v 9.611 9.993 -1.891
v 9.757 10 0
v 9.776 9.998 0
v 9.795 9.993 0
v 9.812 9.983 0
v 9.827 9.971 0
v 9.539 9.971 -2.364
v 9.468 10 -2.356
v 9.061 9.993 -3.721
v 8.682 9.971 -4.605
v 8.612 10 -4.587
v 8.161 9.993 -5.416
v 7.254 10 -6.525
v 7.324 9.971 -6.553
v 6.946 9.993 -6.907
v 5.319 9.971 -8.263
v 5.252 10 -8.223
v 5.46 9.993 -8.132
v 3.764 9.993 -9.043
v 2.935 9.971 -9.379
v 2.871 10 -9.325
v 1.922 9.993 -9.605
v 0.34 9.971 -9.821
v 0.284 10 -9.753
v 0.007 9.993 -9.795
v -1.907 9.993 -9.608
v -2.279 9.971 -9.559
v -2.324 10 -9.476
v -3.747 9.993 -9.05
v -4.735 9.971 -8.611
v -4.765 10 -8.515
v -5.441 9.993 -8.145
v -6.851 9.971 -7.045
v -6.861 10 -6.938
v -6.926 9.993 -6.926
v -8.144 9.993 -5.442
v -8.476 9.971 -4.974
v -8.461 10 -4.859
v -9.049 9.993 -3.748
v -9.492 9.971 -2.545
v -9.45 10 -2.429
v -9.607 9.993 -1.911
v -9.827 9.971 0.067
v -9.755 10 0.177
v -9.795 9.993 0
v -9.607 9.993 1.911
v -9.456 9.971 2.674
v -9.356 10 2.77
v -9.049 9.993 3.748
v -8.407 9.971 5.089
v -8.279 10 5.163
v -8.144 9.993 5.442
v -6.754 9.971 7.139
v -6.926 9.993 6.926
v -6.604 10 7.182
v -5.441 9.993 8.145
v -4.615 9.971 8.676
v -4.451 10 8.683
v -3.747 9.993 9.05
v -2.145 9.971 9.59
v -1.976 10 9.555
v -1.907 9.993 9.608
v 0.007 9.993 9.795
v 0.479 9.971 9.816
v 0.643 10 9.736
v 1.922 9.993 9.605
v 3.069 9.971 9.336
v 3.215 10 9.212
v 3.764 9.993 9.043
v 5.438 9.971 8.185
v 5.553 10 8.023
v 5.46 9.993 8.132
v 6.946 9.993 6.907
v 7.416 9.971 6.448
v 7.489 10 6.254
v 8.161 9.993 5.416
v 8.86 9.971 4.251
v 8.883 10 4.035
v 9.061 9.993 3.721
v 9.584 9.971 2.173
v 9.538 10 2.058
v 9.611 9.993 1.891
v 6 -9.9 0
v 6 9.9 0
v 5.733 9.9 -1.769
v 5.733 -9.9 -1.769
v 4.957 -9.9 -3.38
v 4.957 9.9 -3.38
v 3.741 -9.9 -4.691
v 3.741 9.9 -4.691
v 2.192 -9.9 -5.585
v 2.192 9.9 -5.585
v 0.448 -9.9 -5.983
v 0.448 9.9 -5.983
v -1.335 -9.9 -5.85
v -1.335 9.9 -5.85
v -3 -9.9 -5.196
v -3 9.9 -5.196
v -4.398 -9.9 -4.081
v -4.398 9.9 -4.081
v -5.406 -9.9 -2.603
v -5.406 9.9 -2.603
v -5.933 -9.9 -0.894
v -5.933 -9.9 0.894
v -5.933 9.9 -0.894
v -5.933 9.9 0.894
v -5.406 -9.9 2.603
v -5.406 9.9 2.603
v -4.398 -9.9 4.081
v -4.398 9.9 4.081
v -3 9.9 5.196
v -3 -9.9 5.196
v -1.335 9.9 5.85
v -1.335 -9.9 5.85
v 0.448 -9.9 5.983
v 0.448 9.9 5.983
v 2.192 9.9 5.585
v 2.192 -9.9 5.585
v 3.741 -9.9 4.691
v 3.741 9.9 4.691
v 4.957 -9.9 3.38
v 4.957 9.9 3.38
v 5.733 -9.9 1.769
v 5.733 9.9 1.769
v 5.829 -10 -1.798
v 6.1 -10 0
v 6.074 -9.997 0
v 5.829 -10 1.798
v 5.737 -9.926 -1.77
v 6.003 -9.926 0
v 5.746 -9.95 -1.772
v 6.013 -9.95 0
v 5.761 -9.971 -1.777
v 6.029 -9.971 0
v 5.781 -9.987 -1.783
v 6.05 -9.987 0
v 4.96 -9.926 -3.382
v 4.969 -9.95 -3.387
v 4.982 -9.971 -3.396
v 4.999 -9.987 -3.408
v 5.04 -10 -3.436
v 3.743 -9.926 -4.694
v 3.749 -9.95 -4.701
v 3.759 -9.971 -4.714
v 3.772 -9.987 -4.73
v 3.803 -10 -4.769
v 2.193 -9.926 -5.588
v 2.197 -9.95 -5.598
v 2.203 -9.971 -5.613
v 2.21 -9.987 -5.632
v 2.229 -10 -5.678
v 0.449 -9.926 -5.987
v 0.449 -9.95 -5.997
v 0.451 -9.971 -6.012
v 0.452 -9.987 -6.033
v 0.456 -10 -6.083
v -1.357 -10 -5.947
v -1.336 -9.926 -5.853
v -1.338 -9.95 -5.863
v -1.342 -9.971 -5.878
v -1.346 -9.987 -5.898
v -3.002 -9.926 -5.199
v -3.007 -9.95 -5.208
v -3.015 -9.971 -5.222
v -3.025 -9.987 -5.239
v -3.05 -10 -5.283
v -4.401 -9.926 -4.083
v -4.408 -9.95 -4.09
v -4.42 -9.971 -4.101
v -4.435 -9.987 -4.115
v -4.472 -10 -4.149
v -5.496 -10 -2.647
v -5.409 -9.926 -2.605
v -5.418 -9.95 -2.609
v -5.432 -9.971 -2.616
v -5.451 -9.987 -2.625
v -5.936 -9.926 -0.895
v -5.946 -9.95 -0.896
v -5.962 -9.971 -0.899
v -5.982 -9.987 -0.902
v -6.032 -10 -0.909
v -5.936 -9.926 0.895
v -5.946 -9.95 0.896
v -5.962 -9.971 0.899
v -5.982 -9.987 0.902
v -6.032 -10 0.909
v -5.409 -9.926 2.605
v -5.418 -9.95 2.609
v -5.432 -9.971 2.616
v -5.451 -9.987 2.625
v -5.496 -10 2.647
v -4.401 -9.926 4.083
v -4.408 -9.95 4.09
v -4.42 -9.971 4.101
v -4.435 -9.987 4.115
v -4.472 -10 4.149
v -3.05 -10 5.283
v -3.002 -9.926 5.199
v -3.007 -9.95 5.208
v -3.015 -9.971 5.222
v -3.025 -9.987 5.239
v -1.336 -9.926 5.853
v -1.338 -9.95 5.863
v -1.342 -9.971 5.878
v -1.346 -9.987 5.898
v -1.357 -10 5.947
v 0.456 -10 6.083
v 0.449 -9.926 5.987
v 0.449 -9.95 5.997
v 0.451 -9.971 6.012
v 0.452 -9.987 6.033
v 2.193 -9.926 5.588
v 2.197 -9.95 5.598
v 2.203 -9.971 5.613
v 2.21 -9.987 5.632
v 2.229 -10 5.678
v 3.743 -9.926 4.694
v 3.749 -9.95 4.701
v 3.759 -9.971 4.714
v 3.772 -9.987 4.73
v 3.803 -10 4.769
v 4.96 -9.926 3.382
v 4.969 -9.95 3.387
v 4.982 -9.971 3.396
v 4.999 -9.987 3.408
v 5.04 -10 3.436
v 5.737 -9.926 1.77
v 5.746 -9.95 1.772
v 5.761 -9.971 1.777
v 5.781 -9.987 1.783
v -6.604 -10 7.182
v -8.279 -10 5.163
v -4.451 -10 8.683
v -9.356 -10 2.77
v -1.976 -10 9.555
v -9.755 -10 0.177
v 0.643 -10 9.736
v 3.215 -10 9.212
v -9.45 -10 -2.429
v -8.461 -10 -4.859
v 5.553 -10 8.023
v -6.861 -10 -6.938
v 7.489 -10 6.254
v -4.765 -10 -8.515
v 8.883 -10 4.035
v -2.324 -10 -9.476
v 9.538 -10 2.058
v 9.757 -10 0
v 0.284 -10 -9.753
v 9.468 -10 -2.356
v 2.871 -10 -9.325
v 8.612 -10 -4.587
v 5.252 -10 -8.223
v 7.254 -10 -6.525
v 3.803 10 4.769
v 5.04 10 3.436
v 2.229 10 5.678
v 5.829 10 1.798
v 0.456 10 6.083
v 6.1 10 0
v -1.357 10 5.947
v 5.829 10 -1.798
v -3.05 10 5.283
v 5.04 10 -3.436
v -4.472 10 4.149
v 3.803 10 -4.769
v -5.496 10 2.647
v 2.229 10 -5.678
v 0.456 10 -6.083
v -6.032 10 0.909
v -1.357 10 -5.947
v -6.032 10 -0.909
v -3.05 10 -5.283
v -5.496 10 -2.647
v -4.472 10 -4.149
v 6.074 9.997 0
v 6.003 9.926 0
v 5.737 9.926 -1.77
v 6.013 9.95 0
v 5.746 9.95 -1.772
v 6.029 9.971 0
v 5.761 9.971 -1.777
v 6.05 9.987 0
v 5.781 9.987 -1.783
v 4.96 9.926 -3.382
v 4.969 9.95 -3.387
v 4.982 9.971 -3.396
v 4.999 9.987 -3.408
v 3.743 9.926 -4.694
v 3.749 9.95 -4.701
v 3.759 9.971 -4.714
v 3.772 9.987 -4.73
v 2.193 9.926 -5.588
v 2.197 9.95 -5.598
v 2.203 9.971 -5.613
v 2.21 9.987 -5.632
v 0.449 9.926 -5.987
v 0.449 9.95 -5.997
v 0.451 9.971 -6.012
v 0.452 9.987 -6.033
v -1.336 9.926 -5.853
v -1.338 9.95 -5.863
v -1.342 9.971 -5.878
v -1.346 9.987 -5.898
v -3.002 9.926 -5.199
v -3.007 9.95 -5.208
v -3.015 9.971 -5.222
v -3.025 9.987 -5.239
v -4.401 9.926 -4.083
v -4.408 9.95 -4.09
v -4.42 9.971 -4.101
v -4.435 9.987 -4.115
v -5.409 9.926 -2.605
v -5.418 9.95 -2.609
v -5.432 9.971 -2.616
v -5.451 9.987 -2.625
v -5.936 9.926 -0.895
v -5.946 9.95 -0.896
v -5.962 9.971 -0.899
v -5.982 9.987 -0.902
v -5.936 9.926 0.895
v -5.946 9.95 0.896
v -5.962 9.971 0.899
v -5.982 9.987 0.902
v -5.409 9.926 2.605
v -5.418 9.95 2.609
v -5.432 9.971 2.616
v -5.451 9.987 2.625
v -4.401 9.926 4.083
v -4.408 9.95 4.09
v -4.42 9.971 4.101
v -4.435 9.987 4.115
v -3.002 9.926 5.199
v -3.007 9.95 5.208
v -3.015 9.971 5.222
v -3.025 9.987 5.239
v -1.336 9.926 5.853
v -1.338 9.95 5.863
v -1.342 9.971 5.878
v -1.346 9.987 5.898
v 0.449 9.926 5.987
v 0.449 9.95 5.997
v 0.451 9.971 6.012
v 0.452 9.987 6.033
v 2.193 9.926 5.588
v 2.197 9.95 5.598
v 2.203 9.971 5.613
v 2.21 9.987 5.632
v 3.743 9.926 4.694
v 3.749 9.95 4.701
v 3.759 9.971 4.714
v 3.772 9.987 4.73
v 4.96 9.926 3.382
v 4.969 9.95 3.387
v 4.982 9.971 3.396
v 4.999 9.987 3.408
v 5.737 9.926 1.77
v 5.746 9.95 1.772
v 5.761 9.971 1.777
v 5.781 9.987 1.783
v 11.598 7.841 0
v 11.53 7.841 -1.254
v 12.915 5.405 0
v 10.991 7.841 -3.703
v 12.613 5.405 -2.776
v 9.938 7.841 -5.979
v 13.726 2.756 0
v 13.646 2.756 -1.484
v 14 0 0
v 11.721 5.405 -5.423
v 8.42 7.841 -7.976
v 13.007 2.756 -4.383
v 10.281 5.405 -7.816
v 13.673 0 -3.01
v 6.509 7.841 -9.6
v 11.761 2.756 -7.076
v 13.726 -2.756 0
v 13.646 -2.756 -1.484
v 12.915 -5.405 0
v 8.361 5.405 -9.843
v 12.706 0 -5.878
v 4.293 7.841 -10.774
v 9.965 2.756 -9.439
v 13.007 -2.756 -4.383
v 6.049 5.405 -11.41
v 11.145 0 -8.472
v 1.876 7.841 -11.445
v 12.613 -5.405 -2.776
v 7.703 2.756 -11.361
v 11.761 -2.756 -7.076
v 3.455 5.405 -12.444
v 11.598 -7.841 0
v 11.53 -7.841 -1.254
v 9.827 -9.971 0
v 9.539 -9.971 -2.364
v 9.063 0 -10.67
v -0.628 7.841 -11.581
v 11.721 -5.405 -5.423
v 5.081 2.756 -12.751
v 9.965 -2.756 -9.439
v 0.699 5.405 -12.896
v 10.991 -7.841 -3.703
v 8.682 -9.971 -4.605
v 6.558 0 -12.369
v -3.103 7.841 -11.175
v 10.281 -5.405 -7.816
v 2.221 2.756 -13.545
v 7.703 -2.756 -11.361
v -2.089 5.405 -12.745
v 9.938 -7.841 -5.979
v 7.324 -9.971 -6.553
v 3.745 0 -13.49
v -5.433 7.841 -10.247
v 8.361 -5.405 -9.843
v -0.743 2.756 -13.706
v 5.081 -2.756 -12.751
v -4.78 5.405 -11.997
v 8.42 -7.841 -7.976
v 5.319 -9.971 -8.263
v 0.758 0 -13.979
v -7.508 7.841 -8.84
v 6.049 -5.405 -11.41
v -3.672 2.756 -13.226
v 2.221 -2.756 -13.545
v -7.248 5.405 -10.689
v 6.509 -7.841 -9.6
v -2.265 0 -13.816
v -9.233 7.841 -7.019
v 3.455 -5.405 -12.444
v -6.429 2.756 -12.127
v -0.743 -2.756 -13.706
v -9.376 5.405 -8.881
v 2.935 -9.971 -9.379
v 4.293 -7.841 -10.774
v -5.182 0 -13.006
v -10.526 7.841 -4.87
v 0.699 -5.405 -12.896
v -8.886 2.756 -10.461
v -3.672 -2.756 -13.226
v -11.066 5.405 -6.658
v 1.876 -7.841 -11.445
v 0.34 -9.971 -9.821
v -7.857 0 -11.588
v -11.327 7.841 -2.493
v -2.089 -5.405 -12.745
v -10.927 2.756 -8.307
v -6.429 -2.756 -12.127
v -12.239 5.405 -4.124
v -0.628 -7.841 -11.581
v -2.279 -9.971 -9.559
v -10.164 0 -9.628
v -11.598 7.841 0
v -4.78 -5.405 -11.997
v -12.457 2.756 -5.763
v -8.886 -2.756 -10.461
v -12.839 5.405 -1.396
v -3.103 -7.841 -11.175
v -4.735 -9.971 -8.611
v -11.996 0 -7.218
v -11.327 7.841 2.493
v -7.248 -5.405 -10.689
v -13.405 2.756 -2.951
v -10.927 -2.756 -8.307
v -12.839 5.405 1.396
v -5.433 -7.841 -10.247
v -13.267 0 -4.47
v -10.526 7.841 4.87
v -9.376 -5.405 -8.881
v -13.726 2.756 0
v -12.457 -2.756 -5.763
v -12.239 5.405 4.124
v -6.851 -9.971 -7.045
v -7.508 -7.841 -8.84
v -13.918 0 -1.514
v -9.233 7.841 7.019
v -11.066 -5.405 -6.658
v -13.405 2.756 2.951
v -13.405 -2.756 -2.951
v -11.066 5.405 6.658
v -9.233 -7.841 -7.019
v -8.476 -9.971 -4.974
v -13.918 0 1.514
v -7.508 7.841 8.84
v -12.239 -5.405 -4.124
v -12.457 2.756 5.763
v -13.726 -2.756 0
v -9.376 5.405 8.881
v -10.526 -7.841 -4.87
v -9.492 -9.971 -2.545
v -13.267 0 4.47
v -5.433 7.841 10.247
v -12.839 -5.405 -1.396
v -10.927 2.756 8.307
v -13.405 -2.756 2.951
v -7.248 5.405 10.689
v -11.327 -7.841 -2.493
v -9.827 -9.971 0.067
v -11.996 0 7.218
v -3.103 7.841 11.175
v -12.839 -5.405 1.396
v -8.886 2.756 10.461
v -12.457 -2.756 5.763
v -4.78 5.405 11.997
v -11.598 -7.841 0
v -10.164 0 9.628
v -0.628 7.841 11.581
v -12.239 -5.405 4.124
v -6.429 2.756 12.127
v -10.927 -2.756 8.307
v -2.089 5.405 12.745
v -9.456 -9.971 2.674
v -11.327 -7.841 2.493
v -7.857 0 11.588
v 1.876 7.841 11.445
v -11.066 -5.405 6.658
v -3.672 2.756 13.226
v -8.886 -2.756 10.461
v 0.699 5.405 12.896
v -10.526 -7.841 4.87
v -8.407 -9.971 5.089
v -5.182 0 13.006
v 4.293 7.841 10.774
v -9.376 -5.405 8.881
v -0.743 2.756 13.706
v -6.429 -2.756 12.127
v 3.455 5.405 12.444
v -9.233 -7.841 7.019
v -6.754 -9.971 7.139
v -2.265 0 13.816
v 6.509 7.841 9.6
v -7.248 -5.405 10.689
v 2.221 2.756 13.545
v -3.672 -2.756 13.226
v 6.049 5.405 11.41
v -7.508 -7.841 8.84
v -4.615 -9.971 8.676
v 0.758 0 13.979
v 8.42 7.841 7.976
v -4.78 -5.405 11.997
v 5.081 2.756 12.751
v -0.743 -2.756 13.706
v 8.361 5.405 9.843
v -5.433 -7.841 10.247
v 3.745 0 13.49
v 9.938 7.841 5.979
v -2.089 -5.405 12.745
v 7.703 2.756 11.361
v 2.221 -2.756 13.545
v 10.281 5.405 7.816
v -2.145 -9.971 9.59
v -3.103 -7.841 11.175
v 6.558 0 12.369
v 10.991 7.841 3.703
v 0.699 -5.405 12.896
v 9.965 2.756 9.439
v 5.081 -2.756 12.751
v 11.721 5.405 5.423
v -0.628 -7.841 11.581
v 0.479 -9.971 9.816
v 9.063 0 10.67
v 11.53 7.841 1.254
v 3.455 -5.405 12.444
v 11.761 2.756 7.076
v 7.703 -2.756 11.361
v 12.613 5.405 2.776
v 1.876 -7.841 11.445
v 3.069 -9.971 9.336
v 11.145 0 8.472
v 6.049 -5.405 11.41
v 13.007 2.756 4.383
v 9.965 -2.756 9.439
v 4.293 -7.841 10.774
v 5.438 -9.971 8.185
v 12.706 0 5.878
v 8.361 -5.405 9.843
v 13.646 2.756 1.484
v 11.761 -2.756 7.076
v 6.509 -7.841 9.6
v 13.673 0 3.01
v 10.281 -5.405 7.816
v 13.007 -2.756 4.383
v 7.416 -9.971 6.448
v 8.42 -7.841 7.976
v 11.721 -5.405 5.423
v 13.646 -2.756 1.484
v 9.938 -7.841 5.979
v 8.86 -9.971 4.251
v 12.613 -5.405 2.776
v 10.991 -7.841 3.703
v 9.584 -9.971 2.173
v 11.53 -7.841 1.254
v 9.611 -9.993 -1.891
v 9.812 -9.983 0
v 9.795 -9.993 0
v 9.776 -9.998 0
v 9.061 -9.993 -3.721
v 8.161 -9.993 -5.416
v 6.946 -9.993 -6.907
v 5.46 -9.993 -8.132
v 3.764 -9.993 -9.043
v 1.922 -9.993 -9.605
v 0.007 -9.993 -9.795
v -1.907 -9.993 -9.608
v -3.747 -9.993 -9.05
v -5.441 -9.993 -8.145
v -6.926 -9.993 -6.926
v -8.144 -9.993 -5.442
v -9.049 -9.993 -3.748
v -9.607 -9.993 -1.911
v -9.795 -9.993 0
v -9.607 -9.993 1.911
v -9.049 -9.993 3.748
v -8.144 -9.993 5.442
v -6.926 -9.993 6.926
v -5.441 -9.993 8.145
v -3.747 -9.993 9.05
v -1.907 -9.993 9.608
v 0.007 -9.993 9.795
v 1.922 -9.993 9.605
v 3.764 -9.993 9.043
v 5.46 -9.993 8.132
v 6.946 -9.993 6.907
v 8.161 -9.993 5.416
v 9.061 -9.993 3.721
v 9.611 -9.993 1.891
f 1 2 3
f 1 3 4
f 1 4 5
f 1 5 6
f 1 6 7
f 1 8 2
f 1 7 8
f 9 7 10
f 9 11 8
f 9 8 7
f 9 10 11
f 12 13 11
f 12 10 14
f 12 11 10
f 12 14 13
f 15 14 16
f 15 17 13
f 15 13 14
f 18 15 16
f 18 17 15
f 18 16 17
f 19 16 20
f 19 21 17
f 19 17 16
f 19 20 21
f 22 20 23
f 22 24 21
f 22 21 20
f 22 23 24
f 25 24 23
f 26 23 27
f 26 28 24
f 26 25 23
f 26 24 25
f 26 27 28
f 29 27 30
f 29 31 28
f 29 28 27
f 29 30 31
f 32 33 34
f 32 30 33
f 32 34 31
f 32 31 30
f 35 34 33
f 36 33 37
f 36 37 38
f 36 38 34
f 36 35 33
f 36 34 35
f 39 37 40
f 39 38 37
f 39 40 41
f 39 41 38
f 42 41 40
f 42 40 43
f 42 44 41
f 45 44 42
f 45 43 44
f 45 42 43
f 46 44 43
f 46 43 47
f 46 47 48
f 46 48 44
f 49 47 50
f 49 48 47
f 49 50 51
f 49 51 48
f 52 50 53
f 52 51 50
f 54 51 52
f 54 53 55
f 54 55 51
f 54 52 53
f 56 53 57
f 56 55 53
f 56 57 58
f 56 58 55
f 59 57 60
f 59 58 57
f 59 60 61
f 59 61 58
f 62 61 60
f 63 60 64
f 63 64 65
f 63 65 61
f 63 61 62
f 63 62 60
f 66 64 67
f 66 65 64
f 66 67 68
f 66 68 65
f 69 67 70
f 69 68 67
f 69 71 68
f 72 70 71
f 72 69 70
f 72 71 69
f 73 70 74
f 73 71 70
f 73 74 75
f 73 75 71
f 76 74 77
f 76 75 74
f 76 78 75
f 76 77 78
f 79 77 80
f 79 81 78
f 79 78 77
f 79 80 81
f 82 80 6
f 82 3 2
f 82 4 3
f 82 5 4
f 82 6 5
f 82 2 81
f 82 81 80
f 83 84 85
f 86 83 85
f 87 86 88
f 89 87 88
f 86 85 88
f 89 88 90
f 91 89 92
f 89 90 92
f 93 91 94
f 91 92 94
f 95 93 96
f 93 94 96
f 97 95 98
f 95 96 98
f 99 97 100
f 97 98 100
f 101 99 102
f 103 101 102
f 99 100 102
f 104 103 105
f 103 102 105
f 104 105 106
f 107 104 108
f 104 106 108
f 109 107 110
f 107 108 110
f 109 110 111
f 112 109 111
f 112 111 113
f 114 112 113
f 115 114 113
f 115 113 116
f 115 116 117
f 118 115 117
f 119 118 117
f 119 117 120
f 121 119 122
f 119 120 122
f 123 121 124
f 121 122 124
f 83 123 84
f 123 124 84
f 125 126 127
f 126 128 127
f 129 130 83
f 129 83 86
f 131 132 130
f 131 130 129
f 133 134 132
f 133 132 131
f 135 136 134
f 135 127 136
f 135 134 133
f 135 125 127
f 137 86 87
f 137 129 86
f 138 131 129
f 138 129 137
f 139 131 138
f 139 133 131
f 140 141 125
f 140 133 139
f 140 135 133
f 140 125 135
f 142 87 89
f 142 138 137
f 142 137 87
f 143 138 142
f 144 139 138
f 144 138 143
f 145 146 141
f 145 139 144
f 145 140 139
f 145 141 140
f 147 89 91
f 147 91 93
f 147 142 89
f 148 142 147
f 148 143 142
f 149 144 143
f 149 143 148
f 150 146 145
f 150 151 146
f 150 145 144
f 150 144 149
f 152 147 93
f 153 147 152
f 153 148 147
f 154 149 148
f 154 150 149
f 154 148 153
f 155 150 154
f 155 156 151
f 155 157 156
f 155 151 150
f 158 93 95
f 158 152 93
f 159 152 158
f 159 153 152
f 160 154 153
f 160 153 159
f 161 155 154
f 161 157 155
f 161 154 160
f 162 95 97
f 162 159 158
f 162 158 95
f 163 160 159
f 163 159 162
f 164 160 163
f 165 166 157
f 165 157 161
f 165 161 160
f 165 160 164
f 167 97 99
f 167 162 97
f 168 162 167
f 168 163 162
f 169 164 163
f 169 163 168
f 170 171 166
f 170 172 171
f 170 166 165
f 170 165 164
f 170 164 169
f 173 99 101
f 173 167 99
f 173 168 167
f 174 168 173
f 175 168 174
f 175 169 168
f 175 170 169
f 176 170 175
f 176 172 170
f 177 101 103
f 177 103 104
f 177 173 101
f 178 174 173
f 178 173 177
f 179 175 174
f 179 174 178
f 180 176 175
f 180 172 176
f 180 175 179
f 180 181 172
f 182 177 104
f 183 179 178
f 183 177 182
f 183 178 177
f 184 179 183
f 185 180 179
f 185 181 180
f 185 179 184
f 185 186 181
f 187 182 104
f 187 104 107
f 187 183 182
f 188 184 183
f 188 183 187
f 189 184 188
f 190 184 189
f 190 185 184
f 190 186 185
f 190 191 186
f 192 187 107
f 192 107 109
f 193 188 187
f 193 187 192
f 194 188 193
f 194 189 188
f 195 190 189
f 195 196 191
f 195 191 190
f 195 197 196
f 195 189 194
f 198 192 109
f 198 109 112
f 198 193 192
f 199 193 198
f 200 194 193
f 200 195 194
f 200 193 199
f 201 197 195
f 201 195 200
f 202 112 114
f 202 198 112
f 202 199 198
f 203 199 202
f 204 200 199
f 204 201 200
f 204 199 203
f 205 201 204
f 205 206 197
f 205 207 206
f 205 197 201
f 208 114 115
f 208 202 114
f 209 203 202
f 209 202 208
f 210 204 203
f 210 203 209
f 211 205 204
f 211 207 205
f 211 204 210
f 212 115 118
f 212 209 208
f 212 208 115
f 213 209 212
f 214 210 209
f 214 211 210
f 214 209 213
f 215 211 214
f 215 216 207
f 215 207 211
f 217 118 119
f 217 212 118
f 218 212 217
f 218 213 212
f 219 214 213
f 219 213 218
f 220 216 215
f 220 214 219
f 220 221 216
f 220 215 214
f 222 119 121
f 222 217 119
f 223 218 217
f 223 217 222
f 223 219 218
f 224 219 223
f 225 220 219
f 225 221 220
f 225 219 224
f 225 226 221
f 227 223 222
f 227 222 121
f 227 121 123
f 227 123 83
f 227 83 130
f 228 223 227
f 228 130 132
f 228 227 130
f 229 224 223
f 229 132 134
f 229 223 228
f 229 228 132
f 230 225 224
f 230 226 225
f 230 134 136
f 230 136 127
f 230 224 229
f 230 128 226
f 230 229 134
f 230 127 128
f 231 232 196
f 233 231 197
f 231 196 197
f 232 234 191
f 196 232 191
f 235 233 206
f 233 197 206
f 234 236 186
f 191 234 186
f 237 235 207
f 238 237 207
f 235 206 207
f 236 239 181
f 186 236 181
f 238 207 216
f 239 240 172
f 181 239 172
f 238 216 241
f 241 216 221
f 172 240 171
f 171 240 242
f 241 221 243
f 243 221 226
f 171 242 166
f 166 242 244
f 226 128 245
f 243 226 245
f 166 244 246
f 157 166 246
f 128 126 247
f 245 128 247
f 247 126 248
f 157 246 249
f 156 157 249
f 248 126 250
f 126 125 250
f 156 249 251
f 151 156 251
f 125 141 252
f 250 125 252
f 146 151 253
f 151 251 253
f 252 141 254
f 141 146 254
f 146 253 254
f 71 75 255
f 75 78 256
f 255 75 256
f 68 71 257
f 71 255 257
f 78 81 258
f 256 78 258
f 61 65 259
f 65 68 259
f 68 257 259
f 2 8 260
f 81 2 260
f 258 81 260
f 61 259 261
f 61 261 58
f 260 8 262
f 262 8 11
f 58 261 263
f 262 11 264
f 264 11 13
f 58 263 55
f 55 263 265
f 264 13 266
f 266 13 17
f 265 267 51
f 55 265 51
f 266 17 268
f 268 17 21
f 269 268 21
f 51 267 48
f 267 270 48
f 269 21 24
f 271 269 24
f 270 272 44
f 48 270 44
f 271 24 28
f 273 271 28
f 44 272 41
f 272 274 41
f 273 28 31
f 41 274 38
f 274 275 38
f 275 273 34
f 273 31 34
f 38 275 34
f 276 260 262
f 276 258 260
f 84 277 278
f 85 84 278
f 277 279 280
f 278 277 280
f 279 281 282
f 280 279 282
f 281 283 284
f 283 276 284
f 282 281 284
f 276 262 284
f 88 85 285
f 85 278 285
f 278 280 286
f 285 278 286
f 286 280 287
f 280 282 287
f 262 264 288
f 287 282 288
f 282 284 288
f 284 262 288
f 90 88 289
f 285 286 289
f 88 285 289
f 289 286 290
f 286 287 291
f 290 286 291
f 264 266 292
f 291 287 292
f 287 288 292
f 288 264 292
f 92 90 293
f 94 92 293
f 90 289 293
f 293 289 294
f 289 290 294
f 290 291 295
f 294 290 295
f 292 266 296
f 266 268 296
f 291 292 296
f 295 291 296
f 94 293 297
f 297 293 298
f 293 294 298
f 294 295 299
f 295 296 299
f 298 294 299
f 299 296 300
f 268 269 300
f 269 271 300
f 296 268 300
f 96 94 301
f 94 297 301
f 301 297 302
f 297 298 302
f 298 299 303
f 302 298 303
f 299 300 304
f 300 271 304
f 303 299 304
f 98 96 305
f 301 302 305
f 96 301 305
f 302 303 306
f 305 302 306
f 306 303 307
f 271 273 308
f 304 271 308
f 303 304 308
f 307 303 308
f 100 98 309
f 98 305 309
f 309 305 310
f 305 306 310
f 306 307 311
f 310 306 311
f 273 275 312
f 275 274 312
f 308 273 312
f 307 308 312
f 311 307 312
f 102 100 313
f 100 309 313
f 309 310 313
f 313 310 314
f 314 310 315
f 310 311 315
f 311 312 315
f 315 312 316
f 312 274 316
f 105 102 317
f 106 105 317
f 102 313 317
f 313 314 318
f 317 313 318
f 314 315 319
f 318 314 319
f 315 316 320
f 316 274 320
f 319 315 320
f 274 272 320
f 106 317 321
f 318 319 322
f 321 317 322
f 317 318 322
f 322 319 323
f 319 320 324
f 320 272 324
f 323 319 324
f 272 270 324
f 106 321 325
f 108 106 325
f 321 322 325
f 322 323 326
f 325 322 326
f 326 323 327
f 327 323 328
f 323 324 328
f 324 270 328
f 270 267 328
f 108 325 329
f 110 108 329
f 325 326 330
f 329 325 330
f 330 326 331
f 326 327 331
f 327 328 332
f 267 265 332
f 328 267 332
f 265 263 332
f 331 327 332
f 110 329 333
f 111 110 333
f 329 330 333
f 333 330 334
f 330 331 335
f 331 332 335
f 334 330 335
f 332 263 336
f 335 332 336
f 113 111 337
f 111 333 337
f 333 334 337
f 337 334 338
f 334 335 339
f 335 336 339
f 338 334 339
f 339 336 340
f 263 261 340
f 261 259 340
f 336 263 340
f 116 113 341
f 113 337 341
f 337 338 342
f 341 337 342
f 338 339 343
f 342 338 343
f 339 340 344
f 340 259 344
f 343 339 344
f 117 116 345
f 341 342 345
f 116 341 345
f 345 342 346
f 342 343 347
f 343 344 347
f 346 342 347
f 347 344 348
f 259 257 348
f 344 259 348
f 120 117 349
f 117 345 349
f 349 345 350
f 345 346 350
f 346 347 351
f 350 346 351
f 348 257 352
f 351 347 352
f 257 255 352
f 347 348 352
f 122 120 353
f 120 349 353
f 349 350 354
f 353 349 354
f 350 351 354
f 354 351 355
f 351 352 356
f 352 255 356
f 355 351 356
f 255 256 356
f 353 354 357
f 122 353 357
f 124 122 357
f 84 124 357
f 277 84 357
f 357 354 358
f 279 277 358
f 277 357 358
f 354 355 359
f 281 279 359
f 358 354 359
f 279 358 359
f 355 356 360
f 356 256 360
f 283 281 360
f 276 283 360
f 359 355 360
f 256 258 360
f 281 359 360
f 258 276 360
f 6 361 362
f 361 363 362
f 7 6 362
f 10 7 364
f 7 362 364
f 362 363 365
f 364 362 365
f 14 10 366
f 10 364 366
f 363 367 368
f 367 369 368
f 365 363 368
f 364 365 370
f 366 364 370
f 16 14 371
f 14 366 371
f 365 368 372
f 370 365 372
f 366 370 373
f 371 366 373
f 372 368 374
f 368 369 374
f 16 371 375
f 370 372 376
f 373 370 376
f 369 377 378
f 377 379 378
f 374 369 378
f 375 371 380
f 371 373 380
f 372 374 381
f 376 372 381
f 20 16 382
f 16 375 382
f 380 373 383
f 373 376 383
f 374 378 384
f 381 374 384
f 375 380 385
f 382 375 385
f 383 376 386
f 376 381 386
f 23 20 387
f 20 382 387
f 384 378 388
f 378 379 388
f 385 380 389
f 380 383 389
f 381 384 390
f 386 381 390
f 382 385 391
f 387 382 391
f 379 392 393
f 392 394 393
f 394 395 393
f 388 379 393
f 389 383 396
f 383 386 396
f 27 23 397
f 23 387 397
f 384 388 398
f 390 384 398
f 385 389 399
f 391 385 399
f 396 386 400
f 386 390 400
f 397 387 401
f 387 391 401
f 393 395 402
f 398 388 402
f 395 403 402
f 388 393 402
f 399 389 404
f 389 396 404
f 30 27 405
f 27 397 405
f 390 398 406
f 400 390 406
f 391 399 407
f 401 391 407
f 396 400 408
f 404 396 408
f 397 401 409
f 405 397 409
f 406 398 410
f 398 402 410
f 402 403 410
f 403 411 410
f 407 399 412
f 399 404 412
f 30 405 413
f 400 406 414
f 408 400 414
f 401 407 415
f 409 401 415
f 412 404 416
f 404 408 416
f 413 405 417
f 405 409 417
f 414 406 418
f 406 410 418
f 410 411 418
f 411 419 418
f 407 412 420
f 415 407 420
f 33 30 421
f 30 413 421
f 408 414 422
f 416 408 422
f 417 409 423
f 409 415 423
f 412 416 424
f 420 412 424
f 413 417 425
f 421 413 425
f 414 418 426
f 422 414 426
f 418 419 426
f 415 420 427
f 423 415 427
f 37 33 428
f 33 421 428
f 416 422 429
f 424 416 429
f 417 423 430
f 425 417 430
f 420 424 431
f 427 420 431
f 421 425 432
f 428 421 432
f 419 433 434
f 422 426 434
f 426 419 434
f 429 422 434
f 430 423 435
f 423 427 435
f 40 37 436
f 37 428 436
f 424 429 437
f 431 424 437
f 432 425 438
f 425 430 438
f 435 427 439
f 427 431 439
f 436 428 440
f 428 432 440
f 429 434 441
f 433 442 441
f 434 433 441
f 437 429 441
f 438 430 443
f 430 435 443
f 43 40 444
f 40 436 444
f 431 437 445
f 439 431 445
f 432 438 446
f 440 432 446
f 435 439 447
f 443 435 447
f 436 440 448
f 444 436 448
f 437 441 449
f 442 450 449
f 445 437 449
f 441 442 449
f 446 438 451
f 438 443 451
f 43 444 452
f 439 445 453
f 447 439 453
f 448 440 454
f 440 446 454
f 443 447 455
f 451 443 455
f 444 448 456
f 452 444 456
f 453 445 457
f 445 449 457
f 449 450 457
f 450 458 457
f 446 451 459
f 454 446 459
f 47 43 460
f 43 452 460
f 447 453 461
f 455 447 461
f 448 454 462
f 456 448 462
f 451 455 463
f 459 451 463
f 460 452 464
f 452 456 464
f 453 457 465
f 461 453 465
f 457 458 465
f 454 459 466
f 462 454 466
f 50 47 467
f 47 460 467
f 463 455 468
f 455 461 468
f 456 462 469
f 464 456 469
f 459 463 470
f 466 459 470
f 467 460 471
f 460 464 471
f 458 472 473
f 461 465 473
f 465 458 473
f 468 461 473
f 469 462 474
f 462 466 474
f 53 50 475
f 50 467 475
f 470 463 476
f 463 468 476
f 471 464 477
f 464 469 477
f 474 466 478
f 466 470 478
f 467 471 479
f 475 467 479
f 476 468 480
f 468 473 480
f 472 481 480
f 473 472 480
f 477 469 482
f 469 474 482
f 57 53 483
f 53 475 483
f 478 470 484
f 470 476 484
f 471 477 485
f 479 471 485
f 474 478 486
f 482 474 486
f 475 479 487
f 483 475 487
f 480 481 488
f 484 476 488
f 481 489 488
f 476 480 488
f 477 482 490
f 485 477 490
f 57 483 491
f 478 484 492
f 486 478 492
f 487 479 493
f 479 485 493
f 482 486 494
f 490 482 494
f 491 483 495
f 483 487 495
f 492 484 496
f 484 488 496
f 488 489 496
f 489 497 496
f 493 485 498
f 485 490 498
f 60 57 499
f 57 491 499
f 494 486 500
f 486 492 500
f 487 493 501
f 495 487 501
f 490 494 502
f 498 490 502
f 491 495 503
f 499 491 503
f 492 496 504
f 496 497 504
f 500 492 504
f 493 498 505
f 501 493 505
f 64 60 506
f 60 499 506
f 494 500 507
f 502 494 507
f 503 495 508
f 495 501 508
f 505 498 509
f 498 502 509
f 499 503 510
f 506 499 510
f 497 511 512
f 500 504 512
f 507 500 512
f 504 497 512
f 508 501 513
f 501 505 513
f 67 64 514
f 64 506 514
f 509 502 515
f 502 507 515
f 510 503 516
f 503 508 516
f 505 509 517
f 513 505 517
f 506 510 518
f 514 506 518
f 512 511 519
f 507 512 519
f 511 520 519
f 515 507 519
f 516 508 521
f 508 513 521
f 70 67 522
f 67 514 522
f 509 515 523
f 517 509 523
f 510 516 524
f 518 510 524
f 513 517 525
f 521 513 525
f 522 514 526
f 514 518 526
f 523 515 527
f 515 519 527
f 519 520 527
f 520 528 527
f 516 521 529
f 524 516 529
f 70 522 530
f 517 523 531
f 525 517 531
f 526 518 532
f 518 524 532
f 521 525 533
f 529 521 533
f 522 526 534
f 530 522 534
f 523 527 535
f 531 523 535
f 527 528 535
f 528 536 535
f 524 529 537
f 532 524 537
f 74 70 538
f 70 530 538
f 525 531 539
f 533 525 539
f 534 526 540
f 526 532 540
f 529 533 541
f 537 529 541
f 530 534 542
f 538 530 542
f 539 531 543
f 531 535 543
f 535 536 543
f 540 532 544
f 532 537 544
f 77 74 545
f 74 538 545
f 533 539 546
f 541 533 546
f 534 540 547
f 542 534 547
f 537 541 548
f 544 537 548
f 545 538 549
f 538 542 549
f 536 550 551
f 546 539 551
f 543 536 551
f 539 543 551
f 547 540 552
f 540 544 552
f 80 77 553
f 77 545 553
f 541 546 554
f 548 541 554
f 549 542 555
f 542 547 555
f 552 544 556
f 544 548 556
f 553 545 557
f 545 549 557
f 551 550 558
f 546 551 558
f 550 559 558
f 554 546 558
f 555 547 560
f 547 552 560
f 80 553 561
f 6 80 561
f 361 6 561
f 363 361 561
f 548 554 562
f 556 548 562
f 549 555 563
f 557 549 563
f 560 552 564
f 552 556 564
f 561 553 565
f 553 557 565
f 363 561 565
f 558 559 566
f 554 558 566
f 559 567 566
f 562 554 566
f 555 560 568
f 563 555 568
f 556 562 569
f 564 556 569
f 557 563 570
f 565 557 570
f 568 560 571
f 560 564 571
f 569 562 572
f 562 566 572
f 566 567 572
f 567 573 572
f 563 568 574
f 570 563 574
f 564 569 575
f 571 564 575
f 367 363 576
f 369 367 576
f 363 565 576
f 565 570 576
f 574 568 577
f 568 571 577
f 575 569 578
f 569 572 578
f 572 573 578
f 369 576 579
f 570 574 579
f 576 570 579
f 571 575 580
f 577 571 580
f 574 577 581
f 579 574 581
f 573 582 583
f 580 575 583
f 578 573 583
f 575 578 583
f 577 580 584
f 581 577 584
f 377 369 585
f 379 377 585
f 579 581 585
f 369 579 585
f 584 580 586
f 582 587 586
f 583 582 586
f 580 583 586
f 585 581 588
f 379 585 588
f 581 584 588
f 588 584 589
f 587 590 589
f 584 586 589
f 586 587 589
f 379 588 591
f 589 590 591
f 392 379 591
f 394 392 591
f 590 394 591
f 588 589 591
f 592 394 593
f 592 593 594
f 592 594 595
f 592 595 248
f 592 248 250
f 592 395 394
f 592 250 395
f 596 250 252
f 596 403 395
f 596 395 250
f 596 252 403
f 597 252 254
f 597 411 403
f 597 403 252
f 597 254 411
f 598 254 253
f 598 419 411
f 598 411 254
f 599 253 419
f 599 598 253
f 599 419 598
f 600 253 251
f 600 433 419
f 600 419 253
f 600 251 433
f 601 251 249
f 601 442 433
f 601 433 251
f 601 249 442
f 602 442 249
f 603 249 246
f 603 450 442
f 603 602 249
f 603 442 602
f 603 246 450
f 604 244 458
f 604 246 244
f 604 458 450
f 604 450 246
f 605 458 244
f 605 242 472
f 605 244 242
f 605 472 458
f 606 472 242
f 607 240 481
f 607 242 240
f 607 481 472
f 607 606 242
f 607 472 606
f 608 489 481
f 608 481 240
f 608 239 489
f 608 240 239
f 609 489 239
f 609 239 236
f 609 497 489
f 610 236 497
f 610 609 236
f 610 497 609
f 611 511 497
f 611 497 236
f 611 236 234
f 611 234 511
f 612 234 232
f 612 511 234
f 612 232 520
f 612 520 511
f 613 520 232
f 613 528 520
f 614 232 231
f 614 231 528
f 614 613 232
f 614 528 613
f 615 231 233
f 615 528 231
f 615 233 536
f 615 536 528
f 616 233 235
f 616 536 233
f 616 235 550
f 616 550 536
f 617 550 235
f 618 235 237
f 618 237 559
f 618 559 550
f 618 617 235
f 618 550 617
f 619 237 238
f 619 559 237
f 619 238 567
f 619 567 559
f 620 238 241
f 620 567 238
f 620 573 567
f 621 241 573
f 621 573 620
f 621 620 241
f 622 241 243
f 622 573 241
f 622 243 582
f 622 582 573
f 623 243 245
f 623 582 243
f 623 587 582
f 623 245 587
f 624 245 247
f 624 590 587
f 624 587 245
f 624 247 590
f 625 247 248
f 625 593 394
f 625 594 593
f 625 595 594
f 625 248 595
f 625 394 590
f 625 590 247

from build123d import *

# Parameters (mm, degrees)
FILLET1_R = 0.1


with BuildPart() as part:
    # Sketch1 → Revolve1 (revolve)
    with BuildSketch(Plane.XY):
        with BuildLine():
            Line((6, -10), (6, 10))
            Line((6, 10), (9.797958971, 10))
            ThreePointArc((9.797958971, 10), (14, 0), (9.797958971, -10))
            Line((9.797958971, -10), (6, -10))
        make_face()
    revolve(axis=Axis((0, 0, 0), (0, 1, 0)))

    # Fillet1
    fillet1_edges = [part.edges().sort_by_distance(p)[0] for p in [
        (-9.797958971, -10, 0),
        (-9.797958971, 10, 0),
        (-6, 10, 0),
        (-6, -10, 0),
    ]]
    fillet(fillet1_edges, radius=FILLET1_R)


solid = part.part
